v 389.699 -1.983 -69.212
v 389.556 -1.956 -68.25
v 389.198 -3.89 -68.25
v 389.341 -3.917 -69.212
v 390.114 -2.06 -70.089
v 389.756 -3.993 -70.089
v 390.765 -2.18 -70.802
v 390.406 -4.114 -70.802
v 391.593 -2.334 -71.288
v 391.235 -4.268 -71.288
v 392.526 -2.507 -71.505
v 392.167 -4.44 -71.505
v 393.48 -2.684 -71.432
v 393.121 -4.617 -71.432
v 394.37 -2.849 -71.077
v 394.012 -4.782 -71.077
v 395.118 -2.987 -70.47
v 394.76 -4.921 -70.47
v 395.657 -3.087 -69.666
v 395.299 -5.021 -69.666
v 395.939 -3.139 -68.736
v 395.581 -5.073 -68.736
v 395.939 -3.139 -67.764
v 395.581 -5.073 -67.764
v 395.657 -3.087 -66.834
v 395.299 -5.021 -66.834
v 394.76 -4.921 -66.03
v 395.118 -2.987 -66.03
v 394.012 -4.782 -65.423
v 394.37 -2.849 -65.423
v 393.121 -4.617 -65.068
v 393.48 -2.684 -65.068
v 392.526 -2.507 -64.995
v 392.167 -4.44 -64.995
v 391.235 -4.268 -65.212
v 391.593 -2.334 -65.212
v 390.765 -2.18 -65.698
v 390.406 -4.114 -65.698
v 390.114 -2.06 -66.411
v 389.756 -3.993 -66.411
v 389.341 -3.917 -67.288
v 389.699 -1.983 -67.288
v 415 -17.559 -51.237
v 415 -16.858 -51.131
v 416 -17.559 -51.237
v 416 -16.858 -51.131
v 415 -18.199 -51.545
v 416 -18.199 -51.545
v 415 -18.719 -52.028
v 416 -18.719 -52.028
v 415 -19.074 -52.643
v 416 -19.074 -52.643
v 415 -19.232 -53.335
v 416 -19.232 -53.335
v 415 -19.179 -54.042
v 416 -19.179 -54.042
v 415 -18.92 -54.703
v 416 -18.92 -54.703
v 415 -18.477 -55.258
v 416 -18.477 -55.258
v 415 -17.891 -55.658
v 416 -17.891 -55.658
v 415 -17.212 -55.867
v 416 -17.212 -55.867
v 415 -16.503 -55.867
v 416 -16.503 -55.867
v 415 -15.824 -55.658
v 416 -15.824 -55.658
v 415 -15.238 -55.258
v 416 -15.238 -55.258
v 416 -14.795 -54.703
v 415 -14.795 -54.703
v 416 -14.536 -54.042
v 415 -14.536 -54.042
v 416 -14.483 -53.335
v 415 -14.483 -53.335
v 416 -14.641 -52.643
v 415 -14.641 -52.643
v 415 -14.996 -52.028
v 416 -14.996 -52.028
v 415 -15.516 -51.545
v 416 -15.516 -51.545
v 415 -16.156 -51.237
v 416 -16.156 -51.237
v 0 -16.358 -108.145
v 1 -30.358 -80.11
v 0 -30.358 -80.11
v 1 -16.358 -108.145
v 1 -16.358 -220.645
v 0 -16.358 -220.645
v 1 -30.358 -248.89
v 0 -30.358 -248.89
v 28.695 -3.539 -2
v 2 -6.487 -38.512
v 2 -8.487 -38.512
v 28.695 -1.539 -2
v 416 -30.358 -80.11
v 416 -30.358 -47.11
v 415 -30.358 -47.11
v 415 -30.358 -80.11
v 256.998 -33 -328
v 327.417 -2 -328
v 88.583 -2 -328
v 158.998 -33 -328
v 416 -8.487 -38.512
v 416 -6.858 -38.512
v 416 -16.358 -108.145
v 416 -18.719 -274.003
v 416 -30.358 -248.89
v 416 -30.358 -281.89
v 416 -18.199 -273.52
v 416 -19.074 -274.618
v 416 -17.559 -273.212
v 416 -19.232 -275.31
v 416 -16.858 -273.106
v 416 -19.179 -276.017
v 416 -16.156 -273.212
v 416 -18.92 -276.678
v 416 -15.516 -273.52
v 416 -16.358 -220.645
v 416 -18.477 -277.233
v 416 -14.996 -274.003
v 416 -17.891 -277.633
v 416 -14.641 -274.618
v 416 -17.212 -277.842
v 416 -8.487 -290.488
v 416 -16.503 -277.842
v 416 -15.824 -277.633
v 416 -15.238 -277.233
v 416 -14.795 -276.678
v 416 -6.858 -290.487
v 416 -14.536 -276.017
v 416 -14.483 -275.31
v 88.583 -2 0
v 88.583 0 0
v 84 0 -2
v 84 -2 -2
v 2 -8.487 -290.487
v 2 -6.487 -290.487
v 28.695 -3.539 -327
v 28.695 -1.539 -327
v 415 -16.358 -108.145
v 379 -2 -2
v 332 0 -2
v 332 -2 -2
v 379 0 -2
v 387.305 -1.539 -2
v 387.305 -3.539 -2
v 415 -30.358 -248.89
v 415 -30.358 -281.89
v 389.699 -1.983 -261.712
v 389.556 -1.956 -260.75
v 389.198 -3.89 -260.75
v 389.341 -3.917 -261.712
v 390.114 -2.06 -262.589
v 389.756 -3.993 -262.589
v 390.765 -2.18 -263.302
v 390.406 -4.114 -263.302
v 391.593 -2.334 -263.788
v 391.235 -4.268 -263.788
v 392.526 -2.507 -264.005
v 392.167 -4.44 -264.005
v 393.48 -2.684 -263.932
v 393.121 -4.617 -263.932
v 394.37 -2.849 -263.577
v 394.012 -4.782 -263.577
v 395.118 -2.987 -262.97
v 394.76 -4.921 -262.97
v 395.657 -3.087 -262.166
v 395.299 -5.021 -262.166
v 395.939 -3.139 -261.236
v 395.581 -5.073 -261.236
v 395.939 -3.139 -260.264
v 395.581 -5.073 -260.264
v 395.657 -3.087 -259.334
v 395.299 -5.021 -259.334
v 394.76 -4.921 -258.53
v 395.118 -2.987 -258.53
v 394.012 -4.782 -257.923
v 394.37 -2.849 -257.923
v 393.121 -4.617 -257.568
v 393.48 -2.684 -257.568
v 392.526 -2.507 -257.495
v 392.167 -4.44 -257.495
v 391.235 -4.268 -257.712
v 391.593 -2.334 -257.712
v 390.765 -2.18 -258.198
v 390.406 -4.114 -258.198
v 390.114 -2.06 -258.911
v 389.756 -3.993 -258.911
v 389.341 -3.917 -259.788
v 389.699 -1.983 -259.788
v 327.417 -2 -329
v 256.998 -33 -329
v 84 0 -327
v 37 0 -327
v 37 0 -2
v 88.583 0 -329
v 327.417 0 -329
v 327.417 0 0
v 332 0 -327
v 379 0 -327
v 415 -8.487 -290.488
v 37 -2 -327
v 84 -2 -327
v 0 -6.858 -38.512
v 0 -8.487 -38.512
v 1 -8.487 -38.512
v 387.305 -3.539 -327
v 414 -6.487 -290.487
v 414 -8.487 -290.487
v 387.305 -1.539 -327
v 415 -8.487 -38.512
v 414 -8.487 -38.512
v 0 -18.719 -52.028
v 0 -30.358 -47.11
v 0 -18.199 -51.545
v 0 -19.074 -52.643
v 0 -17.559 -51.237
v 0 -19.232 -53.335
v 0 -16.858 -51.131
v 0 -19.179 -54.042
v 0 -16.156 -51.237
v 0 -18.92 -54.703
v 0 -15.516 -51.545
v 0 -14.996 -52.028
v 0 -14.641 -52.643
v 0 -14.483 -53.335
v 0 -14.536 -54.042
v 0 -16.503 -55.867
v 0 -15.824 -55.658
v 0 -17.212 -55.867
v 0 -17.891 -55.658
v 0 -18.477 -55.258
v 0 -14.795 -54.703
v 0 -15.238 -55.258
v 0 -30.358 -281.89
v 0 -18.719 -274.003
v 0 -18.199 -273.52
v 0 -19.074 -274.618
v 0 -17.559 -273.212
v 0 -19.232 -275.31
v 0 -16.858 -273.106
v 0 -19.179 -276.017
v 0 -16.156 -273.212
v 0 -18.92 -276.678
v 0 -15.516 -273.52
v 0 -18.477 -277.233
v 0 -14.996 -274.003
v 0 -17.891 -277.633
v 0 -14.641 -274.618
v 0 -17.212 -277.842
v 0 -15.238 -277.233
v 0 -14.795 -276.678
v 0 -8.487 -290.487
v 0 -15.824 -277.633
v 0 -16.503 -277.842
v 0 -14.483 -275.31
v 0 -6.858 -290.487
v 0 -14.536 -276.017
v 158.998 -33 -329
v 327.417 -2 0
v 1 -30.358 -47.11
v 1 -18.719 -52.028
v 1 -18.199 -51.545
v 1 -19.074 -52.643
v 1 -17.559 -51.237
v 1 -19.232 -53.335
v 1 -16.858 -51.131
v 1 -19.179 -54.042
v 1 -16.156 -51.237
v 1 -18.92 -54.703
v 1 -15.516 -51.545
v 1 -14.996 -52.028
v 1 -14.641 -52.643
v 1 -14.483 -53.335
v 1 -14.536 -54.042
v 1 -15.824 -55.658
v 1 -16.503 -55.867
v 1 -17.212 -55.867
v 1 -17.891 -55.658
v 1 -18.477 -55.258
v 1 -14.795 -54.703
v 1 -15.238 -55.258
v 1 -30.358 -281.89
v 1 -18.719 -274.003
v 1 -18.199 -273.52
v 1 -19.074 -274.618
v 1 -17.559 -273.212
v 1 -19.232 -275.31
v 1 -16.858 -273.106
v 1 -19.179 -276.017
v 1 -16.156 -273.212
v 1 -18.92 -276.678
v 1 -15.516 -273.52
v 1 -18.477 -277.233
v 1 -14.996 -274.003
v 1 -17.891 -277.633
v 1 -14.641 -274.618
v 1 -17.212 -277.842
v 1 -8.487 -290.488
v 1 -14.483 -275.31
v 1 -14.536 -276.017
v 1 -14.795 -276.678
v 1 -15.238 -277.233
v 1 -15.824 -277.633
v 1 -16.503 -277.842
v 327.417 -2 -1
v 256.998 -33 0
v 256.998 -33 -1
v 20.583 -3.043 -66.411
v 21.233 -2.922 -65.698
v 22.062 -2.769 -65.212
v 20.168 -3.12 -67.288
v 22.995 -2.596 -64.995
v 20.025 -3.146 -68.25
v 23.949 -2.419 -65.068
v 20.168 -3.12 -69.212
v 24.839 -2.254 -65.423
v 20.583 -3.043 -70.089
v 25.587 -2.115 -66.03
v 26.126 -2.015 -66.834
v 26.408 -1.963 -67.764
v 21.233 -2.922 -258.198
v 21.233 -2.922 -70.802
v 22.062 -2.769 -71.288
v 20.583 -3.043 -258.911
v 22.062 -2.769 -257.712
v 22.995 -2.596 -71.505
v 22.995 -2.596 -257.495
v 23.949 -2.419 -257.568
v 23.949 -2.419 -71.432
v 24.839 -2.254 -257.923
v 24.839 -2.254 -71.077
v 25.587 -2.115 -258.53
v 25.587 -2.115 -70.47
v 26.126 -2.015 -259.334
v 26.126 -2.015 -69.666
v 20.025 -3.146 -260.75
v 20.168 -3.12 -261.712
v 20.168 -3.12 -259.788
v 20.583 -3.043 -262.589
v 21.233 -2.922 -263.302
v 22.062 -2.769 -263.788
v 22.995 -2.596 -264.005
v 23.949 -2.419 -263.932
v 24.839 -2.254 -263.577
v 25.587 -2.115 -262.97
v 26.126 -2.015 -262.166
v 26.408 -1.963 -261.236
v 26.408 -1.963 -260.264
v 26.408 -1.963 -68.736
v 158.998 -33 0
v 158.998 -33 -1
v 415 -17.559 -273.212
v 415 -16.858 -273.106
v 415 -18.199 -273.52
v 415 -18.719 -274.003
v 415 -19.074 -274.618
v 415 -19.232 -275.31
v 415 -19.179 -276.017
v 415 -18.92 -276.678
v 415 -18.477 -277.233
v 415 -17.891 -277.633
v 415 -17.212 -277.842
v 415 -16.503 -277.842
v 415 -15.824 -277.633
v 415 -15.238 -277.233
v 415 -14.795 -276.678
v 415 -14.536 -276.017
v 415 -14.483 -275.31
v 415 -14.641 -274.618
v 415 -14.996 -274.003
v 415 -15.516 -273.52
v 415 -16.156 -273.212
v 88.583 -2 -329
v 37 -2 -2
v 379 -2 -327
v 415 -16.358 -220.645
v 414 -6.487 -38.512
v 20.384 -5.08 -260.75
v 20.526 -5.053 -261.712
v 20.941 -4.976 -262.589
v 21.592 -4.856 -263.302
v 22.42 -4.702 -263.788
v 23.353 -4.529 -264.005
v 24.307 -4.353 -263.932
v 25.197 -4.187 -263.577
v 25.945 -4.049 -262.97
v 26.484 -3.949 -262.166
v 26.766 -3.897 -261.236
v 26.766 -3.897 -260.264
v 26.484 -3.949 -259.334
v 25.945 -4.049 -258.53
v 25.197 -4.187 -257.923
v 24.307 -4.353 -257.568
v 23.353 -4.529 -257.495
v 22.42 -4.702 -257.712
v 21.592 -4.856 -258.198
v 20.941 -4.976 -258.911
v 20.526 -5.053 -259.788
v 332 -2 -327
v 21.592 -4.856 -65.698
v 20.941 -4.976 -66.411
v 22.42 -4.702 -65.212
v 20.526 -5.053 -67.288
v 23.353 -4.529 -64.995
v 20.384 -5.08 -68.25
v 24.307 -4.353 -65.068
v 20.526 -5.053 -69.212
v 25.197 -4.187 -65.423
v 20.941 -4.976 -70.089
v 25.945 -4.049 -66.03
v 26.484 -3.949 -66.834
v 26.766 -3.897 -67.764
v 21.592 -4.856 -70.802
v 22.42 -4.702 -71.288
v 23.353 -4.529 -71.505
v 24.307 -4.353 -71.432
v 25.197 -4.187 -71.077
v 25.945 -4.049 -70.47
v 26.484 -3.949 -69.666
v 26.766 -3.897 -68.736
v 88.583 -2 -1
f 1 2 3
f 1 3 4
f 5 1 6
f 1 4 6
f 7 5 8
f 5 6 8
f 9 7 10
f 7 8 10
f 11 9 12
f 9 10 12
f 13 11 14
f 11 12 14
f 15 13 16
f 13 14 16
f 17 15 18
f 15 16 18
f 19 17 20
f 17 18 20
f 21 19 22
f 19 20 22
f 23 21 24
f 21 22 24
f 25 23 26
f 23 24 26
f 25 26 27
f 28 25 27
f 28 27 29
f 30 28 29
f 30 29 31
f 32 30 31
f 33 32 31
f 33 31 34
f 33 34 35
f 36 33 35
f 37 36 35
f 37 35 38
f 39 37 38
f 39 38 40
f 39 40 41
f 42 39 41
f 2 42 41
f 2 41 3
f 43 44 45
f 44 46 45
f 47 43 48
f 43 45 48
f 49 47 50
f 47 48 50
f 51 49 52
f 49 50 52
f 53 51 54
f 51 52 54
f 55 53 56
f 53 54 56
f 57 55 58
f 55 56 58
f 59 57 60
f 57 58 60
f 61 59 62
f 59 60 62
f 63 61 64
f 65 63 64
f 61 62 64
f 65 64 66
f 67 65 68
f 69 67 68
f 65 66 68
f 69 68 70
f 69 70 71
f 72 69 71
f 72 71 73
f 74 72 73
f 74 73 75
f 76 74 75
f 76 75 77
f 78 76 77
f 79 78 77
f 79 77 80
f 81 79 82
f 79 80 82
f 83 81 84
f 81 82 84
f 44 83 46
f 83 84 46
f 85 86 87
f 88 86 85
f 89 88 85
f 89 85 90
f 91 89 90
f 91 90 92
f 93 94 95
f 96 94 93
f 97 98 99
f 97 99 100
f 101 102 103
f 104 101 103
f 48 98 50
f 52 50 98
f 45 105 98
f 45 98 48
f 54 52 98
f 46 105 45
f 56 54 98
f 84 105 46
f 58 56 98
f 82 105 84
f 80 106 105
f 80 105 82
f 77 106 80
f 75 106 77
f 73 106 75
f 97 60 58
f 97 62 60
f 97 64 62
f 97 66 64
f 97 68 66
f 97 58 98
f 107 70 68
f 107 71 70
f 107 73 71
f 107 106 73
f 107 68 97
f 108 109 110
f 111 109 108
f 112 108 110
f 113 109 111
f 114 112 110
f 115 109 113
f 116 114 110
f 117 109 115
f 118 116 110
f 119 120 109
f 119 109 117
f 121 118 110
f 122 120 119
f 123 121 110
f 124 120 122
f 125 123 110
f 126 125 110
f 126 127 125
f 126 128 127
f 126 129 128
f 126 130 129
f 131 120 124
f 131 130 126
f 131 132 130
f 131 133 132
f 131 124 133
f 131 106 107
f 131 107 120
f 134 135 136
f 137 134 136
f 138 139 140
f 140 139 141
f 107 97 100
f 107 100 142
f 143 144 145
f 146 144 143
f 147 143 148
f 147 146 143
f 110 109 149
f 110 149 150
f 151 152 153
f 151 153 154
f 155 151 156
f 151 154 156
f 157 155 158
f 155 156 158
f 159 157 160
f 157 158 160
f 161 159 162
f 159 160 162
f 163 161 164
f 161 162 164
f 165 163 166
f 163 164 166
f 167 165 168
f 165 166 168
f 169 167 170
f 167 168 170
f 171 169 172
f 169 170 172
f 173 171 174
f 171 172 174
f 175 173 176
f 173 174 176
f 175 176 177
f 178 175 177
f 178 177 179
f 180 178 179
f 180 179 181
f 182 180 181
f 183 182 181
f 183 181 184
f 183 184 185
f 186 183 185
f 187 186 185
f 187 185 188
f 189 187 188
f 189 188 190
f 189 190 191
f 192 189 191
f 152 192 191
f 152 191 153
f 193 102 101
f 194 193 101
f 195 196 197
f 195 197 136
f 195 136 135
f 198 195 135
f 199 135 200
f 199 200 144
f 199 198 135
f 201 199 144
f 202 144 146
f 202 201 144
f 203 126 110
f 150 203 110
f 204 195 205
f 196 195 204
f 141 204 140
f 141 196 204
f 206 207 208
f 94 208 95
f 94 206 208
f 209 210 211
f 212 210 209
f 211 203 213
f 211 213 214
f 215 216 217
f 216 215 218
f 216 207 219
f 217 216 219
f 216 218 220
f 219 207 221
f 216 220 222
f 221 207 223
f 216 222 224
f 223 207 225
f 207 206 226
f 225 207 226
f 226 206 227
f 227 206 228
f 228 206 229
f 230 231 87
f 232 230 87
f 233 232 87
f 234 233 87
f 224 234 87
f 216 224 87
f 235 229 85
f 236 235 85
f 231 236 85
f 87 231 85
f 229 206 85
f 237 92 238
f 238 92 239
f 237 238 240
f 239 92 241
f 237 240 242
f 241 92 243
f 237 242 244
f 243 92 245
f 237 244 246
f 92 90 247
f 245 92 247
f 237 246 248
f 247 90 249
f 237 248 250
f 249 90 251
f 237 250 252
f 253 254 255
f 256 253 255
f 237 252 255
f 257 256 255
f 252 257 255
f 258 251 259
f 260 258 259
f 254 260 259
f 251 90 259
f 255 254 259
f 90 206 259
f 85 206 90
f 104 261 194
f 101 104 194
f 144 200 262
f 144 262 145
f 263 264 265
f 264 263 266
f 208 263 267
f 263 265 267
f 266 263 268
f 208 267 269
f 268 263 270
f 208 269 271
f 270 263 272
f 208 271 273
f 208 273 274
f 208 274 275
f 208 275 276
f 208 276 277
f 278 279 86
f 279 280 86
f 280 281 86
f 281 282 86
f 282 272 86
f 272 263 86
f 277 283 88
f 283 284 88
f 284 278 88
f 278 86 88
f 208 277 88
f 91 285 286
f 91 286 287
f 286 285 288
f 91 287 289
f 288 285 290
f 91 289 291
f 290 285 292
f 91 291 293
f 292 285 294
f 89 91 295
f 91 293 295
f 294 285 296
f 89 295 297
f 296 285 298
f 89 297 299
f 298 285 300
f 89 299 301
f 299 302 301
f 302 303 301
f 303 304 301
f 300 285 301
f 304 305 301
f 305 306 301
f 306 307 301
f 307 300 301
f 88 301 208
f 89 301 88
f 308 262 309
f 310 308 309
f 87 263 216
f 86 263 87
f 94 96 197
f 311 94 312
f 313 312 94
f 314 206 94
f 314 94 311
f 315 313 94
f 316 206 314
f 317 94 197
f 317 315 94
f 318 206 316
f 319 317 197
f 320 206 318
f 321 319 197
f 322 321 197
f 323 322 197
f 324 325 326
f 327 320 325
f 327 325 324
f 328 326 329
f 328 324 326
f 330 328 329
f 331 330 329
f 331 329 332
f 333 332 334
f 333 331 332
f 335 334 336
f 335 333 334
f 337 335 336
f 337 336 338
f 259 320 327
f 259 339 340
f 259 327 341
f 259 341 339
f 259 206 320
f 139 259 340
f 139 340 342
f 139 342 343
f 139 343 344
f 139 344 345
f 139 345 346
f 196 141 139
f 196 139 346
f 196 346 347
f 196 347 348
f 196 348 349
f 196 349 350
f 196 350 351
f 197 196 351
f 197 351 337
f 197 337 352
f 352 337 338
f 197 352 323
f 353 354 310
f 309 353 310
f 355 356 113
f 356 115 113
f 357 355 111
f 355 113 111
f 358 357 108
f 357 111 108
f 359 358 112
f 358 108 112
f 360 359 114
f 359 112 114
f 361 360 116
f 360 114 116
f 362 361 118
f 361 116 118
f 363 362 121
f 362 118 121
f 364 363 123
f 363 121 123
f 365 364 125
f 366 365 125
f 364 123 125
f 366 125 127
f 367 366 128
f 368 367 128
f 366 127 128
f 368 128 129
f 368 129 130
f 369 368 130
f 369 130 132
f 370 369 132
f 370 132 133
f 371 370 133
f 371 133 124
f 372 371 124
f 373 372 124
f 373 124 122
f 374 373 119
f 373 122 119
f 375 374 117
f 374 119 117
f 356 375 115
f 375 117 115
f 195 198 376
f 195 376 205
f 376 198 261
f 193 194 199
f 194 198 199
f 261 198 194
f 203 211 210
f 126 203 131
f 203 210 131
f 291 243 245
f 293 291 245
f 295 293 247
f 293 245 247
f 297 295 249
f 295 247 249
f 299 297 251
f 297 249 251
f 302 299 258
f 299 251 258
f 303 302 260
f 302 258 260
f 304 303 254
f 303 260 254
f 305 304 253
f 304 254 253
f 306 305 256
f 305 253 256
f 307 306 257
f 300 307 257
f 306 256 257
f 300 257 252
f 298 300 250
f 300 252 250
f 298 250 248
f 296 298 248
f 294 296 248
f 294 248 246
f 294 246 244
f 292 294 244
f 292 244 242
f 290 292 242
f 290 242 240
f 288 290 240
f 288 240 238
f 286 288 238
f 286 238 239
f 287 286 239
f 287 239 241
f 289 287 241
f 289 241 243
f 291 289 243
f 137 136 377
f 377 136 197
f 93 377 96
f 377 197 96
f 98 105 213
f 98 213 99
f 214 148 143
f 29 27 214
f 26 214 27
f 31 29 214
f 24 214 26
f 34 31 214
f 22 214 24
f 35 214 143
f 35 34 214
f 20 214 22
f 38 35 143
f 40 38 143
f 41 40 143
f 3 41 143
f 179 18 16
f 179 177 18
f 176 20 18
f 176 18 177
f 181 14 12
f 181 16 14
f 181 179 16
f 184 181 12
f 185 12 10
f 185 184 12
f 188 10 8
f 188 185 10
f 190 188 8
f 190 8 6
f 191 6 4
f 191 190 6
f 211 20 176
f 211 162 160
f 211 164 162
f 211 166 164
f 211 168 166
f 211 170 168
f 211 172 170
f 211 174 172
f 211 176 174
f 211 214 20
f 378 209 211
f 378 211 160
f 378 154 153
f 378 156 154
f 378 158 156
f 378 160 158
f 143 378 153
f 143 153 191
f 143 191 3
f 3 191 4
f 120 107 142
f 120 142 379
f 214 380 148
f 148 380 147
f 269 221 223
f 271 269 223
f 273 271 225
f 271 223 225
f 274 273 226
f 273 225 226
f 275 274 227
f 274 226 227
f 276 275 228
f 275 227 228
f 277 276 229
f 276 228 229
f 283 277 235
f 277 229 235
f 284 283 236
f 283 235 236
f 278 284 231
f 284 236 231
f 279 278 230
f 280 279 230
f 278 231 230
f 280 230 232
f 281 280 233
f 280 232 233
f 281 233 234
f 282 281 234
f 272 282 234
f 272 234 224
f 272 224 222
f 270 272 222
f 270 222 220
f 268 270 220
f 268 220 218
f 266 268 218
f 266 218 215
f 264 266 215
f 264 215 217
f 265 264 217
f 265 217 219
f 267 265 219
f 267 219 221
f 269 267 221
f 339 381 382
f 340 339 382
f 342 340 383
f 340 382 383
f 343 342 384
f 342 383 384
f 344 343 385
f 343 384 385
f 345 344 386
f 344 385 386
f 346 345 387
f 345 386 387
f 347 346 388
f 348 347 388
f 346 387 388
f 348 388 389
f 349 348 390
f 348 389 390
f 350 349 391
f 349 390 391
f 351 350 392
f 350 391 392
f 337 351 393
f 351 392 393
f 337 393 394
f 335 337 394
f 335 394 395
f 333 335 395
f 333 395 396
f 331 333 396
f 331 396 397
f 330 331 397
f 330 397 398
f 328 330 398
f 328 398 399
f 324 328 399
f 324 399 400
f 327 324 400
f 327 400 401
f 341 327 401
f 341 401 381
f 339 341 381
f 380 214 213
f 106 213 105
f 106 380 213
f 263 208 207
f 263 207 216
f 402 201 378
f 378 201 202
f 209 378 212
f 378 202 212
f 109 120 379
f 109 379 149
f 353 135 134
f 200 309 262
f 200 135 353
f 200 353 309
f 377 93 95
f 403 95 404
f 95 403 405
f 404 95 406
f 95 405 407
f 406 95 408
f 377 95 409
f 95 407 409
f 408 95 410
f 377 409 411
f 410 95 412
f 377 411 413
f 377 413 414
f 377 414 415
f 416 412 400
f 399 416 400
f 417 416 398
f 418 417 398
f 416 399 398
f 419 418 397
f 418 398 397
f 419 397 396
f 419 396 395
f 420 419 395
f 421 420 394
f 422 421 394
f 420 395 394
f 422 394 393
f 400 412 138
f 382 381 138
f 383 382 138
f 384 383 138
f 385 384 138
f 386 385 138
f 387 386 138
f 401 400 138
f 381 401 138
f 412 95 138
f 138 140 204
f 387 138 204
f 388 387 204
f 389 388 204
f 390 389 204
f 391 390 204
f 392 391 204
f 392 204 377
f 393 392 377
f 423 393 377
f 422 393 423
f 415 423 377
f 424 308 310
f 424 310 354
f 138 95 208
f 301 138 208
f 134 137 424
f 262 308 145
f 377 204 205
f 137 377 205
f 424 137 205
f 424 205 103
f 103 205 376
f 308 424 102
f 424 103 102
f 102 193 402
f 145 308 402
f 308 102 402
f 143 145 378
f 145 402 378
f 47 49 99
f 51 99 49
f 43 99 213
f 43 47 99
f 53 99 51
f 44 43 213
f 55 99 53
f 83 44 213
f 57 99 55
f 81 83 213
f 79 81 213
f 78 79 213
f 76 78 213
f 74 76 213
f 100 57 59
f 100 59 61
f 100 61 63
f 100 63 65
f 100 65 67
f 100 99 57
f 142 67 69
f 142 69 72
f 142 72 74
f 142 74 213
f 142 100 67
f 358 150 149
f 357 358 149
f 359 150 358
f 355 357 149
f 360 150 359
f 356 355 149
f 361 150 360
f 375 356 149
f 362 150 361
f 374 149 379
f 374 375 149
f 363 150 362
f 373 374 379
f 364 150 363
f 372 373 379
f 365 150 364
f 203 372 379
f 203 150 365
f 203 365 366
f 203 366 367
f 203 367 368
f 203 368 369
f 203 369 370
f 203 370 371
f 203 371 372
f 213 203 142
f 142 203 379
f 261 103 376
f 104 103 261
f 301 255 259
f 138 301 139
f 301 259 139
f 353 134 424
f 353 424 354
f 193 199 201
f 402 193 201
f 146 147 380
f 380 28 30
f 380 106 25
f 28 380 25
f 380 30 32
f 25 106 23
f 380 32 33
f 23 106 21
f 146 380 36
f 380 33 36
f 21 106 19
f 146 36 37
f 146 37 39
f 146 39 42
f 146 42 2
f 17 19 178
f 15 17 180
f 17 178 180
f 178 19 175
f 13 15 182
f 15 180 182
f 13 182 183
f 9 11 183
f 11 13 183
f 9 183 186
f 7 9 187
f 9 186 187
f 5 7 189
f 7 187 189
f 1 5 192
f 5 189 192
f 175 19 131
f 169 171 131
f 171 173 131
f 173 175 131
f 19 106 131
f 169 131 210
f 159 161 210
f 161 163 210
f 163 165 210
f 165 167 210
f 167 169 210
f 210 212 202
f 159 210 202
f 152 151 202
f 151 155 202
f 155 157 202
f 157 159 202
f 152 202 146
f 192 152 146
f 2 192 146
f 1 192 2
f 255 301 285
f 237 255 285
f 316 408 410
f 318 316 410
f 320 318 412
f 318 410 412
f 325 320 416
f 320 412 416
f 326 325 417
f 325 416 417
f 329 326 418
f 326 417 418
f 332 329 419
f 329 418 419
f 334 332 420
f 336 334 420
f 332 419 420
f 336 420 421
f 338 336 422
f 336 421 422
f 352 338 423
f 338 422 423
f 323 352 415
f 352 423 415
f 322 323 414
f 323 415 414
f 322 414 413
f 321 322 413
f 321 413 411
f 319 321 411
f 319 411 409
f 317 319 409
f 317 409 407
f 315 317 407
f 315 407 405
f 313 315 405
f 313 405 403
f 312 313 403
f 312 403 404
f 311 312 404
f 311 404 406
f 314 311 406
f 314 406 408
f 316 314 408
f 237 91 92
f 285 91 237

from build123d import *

# Parameters (mm, degrees)
ESQUISSE1_W                  = 416
ESQUISSE1_H                  = 329
BOSS_EXTRU_1_DEPTH           = 33
ENL_V_MAT_EXTRU_1_DEPTH      = 532.400037636
ESQUISSE3_W                  = 2
ESQUISSE3_H                  = 36.5125
ENL_V_MAT_EXTRU_2_DEPTH      = 532.400037636
ENL_V_MAT_EXTRU_3_DEPTH      = 509.456475675
ENL_V_MAT_EXTRU_3_DEPTH_BACK = 509.456475675
ENL_V_MAT_EXTRU_11_DEPTH     = 531.164125531
ENL_V_MAT_EXTRU_4_DEPTH      = 540.111732489
ENL_V_MAT_EXTRU_5_DEPTH      = 540.298629883
ESQUISSE10_W                 = 251.975
ESQUISSE10_H                 = 2.642455338
ENL_V_MAT_EXTRU_6_DEPTH      = 532.400037636
ENL_V_MAT_EXTRU_12_REACH     = 470.566
ESQUISSE18_W                 = 8
ESQUISSE18_H                 = 31
ENL_V_MAT_EXTRU_14_DEPTH     = 600
ESQUISSE20_W                 = 1
ESQUISSE20_H                 = 31
ENL_V_MAT_EXTRU_16_DEPTH     = 466.330172822
ENL_V_MAT_EXTRU_15_DEPTH     = 532.400037636
ESQUISSE21_W                 = 1
ESQUISSE21_H                 = 21.870678089
ENL_V_MAT_EXTRU_17_DEPTH     = 509.456475675
ENL_V_MAT_EXTRU_18_DEPTH     = 532.400037636
D_GAGEMENT_1_41_D            = 6.5278
D_GAGEMENT_1_42_D            = 6.5278
ENL_V_MAT_EXTRU_19_REACH     = 533.4
ESQUISSE27_R                 = 2.38125
ENL_V_MAT_EXTRU_20_REACH     = 533.4
ESQUISSE28_R                 = 2.38125


with BuildPart() as part:
    # Esquisse1 → Boss.-Extru.1 (new body)
    with BuildSketch(Plane(origin=(0, 0, 0), x_dir=(1, 0, 0), z_dir=(0, 1, 0))):
        with Locations((208, 164.5)):
            Rectangle(ESQUISSE1_W, ESQUISSE1_H)
    extrude(amount=-BOSS_EXTRU_1_DEPTH)

    # Esquisse2 → Enlèv. mat.-Extru.1 (cut, through all)
    with BuildSketch(Plane(origin=(0, 0, 0), x_dir=(1, 0, 0), z_dir=(0, 1, 0))):
        Polygon((327.417424305, 0), (332, 2), (416, 2), (416, 0), align=None)
        Polygon((88.582575695, 0), (84, 2), (0, 2), (0, 0), align=None)
        Polygon((88.582575695, 329), (84, 327), (0, 327), (0, 329), align=None)
        Polygon((327.417424305, 329), (332, 327), (416, 327), (416, 329), align=None)
    extrude(amount=-ENL_V_MAT_EXTRU_1_DEPTH, mode=Mode.SUBTRACT)

    # Esquisse3 → Enlèv. mat.-Extru.2 (cut, through all)
    with BuildSketch(Plane(origin=(0, 0, 0), x_dir=(1, 0, 0), z_dir=(0, 1, 0))):
        with Locations((415, 20.25625)):
            Rectangle(ESQUISSE3_W, ESQUISSE3_H)
        with Locations((415, 308.74375)):
            Rectangle(ESQUISSE3_W, ESQUISSE3_H)
        with Locations((1, 308.74375)):
            Rectangle(ESQUISSE3_W, ESQUISSE3_H)
        with Locations((1, 20.25625)):
            Rectangle(ESQUISSE3_W, ESQUISSE3_H)
    extrude(amount=-ENL_V_MAT_EXTRU_2_DEPTH, mode=Mode.SUBTRACT)

    # Esquisse7 → Enlèv. mat.-Extru.3 (cut, two sides: drawn at the far end of the back side and taken through both)
    with BuildSketch(Plane.XY.offset(-38.5125).offset(-ENL_V_MAT_EXTRU_3_DEPTH_BACK)):
        Polygon((416, -6.857544662), (379, 0), (416, 0), align=None)
        Polygon((0, -6.857544662), (37, 0), (0, 0), align=None)
    extrude(amount=ENL_V_MAT_EXTRU_3_DEPTH + ENL_V_MAT_EXTRU_3_DEPTH_BACK, mode=Mode.SUBTRACT)

    # Esquisse15 → Enlèv. mat.-Extru.11 (cut, through all)
    with BuildSketch(Plane(origin=(0, 0, -327), x_dir=(-1, 0, 0), z_dir=(0, 0, -1))):
        Polygon((-84, -33), (-2, -33), (-2, -8.486866573), (-37, -2), (-84, -2), align=None)
        Polygon((-414, -33), (-414, -8.486866573), (-379, -2), (-332, -2), (-332, -33), align=None)
    extrude(amount=-ENL_V_MAT_EXTRU_11_DEPTH, mode=Mode.SUBTRACT)

    # Esquisse8 → Enlèv. mat.-Extru.4 (cut, through all, along a direction that is not the sketch's normal)
    with BuildSketch(Plane(origin=(1.22876211, -6.629807067, 0), x_dir=(0.9832549075639557, 0.1822355254921413, 0), z_dir=(-0.1822355254921413, 0.9832549075639557, 0))):
        Polygon((0.784372276, 38.5125), (27.933724824, 2), (0.784372276, 2), align=None)
        Polygon((0.784372276, 290.4875), (27.933724824, 327), (0.784372276, 327), align=None)
    extrude(amount=-ENL_V_MAT_EXTRU_4_DEPTH, dir=(0, 1, 0), mode=Mode.SUBTRACT)

    # Esquisse9 → Enlèv. mat.-Extru.5 (cut, through all, along a direction that is not the sketch's normal)
    with BuildSketch(Plane(origin=(12.586509179, 67.910726439, 0), x_dir=(0.9832549075639558, -0.18223552549214084, 0), z_dir=(0.18223552549214084, 0.9832549075639558, 0))):
        Polygon((408.24966927, 290.4875), (381.100316723, 327), (408.24966927, 327), align=None)
        Polygon((408.24966927, 38.5125), (381.100316723, 2), (408.24966927, 2), align=None)
    extrude(amount=-ENL_V_MAT_EXTRU_5_DEPTH, dir=(0, 1, 0), mode=Mode.SUBTRACT)

    # Esquisse10 → Enlèv. mat.-Extru.6 (cut, through all)
    with BuildSketch(Plane(origin=(416, 0, 0), x_dir=(0, 0, -1), z_dir=(1, 0, 0))):
        with Locations((164.5, -31.678772331)):
            Rectangle(ESQUISSE10_W, ESQUISSE10_H)
    extrude(amount=-ENL_V_MAT_EXTRU_6_DEPTH, mode=Mode.SUBTRACT)

    # Esquisse16 → Enlèv. mat.-Extru.12 (cut, up to next)
    with BuildSketch(Plane.ZY.offset(-84), mode=Mode.PRIVATE) as enl_v_mat_extru_12_sk1:
        Polygon((-290.4875, -30.357544662), (-290.4875, -33), (-327, -33), (-327, -2), (-2, -2), (-2, -33), (-38.5125, -33), (-38.5125, -30.357544662), align=None)
    enl_v_mat_extru_12_tool1 = extrude(enl_v_mat_extru_12_sk1.sketch, amount=-ENL_V_MAT_EXTRU_12_REACH, mode=Mode.PRIVATE) & part.part
    add(enl_v_mat_extru_12_tool1.solids().sort_by_distance((84, -16.49665, -164.5))[0], mode=Mode.SUBTRACT)

    # Esquisse18 → Enlèv. mat.-Extru.14 (cut)
    with BuildSketch(Plane.XY):
        with Locations((331.417424305, -17.5)):
            Rectangle(ESQUISSE18_W, ESQUISSE18_H)
        with Locations((84.582575695, -17.5)):
            Rectangle(ESQUISSE18_W, ESQUISSE18_H)
    extrude(amount=-ENL_V_MAT_EXTRU_14_DEPTH, mode=Mode.SUBTRACT)

    # Esquisse20 → Enlèv. mat.-Extru.16 (cut, through all)
    with BuildSketch(Plane(origin=(327.417424305, 0, 0), x_dir=(0, 0, -1), z_dir=(1, 0, 0))):
        with Locations((1.5, -17.5)):
            Rectangle(ESQUISSE20_W, ESQUISSE20_H)
        with Locations((327.5, -17.5)):
            Rectangle(ESQUISSE20_W, ESQUISSE20_H)
    extrude(amount=-ENL_V_MAT_EXTRU_16_DEPTH, mode=Mode.SUBTRACT)

    # Esquisse19 → Enlèv. mat.-Extru.15 (cut, through all)
    with BuildSketch(Plane.XY):
        Polygon((88.582575695, -2), (158.997575695, -33), (88.582575695, -33), align=None)
        Polygon((327.417424305, -2), (256.997575695, -33), (327.417424305, -33), align=None)
    extrude(amount=-ENL_V_MAT_EXTRU_15_DEPTH, mode=Mode.SUBTRACT)

    # Esquisse21 → Enlèv. mat.-Extru.17 (cut, through all)
    with BuildSketch(Plane(origin=(0, 0, -290.4875), x_dir=(-1, 0, 0), z_dir=(0, 0, -1))):
        with Locations((-414.5, -19.422205618)):
            Rectangle(ESQUISSE21_W, ESQUISSE21_H)
        with Locations((-1.5, -19.422205618)):
            Rectangle(ESQUISSE21_W, ESQUISSE21_H)
    extrude(amount=-ENL_V_MAT_EXTRU_17_DEPTH, mode=Mode.SUBTRACT)

    # Esquisse22 → Enlèv. mat.-Extru.18 (cut, through all)
    with BuildSketch(Plane(origin=(416, 0, 0), x_dir=(0, 0, -1), z_dir=(1, 0, 0))):
        Polygon((38.5125, -8.486866573), (47.110374149, -30.357544662), (38.5125, -30.357544662), align=None)
        Polygon((290.4875, -8.486866573), (281.889625851, -30.357544662), (290.4875, -30.357544662), align=None)
        Polygon((80.110374149, -30.357544662), (108.145374149, -16.357544662), (220.645374149, -16.357544662), (248.889625851, -30.357544662), align=None)
    extrude(amount=-ENL_V_MAT_EXTRU_18_DEPTH, mode=Mode.SUBTRACT)

    # Dégagement 1/41 (through all)
    with Locations(Plane(origin=(12.586509179, 67.910726439, 0), x_dir=(0.9832549075639558, -0.18223552549214084, 0), z_dir=(0.18223552549214084, 0.9832549075639558, 0))):
        with Locations((386.653609967, 68.25), (386.653609967, 260.75)):
            Hole(D_GAGEMENT_1_41_D / 2)

    # Dégagement 1/42 (through all)
    with Locations(Plane(origin=(1.22876211, -6.629807067, 0), x_dir=(0.9832549075639557, 0.18223552549214128, 0), z_dir=(-0.1822355254921413, 0.9832549075639558, 0))):
        with Locations((22.38043158, 68.25), (22.38043158, 260.75)):
            Hole(D_GAGEMENT_1_42_D / 2)

    # Esquisse27 → Enlèv. mat.-Extru.19 (cut, up to next)
    with BuildSketch(Plane.ZY, mode=Mode.PRIVATE) as enl_v_mat_extru_19_sk1:
        with Locations((-275.4875, -16.857544662)):
            Circle(ESQUISSE27_R)
    enl_v_mat_extru_19_tool1 = extrude(enl_v_mat_extru_19_sk1.sketch, amount=-ENL_V_MAT_EXTRU_19_REACH, mode=Mode.PRIVATE) & part.part
    # Esquisse27 → Enlèv. mat.-Extru.19 (cut, up to next)
    with BuildSketch(Plane.ZY, mode=Mode.PRIVATE) as enl_v_mat_extru_19_sk2:
        with Locations((-53.5125, -16.857544662)):
            Circle(ESQUISSE27_R)
    enl_v_mat_extru_19_tool2 = extrude(enl_v_mat_extru_19_sk2.sketch, amount=-ENL_V_MAT_EXTRU_19_REACH, mode=Mode.PRIVATE) & part.part
    add(enl_v_mat_extru_19_tool1.solids().sort_by_distance((0, -16.857545, -275.4875))[0], mode=Mode.SUBTRACT)
    add(enl_v_mat_extru_19_tool2.solids().sort_by_distance((0, -16.857545, -53.5125))[0], mode=Mode.SUBTRACT)

    # Esquisse28 → Enlèv. mat.-Extru.20 (cut, up to next)
    with BuildSketch(Plane(origin=(416, 0, 0), x_dir=(0, 0, -1), z_dir=(1, 0, 0)), mode=Mode.PRIVATE) as enl_v_mat_extru_20_sk1:
        with Locations(Location((53.5125, -16.857544662, 0), (0, 0, 180))):
            Circle(ESQUISSE28_R)
    enl_v_mat_extru_20_tool1 = extrude(enl_v_mat_extru_20_sk1.sketch, amount=-ENL_V_MAT_EXTRU_20_REACH, mode=Mode.PRIVATE) & part.part
    # Esquisse28 → Enlèv. mat.-Extru.20 (cut, up to next)
    with BuildSketch(Plane(origin=(416, 0, 0), x_dir=(0, 0, -1), z_dir=(1, 0, 0)), mode=Mode.PRIVATE) as enl_v_mat_extru_20_sk2:
        with Locations(Location((275.4875, -16.857544662, 0), (0, 0, 180))):
            Circle(ESQUISSE28_R)
    enl_v_mat_extru_20_tool2 = extrude(enl_v_mat_extru_20_sk2.sketch, amount=-ENL_V_MAT_EXTRU_20_REACH, mode=Mode.PRIVATE) & part.part
    add(enl_v_mat_extru_20_tool1.solids().sort_by_distance((416, -16.857545, -53.5125))[0], mode=Mode.SUBTRACT)
    add(enl_v_mat_extru_20_tool2.solids().sort_by_distance((416, -16.857545, -275.4875))[0], mode=Mode.SUBTRACT)


solid = part.part
